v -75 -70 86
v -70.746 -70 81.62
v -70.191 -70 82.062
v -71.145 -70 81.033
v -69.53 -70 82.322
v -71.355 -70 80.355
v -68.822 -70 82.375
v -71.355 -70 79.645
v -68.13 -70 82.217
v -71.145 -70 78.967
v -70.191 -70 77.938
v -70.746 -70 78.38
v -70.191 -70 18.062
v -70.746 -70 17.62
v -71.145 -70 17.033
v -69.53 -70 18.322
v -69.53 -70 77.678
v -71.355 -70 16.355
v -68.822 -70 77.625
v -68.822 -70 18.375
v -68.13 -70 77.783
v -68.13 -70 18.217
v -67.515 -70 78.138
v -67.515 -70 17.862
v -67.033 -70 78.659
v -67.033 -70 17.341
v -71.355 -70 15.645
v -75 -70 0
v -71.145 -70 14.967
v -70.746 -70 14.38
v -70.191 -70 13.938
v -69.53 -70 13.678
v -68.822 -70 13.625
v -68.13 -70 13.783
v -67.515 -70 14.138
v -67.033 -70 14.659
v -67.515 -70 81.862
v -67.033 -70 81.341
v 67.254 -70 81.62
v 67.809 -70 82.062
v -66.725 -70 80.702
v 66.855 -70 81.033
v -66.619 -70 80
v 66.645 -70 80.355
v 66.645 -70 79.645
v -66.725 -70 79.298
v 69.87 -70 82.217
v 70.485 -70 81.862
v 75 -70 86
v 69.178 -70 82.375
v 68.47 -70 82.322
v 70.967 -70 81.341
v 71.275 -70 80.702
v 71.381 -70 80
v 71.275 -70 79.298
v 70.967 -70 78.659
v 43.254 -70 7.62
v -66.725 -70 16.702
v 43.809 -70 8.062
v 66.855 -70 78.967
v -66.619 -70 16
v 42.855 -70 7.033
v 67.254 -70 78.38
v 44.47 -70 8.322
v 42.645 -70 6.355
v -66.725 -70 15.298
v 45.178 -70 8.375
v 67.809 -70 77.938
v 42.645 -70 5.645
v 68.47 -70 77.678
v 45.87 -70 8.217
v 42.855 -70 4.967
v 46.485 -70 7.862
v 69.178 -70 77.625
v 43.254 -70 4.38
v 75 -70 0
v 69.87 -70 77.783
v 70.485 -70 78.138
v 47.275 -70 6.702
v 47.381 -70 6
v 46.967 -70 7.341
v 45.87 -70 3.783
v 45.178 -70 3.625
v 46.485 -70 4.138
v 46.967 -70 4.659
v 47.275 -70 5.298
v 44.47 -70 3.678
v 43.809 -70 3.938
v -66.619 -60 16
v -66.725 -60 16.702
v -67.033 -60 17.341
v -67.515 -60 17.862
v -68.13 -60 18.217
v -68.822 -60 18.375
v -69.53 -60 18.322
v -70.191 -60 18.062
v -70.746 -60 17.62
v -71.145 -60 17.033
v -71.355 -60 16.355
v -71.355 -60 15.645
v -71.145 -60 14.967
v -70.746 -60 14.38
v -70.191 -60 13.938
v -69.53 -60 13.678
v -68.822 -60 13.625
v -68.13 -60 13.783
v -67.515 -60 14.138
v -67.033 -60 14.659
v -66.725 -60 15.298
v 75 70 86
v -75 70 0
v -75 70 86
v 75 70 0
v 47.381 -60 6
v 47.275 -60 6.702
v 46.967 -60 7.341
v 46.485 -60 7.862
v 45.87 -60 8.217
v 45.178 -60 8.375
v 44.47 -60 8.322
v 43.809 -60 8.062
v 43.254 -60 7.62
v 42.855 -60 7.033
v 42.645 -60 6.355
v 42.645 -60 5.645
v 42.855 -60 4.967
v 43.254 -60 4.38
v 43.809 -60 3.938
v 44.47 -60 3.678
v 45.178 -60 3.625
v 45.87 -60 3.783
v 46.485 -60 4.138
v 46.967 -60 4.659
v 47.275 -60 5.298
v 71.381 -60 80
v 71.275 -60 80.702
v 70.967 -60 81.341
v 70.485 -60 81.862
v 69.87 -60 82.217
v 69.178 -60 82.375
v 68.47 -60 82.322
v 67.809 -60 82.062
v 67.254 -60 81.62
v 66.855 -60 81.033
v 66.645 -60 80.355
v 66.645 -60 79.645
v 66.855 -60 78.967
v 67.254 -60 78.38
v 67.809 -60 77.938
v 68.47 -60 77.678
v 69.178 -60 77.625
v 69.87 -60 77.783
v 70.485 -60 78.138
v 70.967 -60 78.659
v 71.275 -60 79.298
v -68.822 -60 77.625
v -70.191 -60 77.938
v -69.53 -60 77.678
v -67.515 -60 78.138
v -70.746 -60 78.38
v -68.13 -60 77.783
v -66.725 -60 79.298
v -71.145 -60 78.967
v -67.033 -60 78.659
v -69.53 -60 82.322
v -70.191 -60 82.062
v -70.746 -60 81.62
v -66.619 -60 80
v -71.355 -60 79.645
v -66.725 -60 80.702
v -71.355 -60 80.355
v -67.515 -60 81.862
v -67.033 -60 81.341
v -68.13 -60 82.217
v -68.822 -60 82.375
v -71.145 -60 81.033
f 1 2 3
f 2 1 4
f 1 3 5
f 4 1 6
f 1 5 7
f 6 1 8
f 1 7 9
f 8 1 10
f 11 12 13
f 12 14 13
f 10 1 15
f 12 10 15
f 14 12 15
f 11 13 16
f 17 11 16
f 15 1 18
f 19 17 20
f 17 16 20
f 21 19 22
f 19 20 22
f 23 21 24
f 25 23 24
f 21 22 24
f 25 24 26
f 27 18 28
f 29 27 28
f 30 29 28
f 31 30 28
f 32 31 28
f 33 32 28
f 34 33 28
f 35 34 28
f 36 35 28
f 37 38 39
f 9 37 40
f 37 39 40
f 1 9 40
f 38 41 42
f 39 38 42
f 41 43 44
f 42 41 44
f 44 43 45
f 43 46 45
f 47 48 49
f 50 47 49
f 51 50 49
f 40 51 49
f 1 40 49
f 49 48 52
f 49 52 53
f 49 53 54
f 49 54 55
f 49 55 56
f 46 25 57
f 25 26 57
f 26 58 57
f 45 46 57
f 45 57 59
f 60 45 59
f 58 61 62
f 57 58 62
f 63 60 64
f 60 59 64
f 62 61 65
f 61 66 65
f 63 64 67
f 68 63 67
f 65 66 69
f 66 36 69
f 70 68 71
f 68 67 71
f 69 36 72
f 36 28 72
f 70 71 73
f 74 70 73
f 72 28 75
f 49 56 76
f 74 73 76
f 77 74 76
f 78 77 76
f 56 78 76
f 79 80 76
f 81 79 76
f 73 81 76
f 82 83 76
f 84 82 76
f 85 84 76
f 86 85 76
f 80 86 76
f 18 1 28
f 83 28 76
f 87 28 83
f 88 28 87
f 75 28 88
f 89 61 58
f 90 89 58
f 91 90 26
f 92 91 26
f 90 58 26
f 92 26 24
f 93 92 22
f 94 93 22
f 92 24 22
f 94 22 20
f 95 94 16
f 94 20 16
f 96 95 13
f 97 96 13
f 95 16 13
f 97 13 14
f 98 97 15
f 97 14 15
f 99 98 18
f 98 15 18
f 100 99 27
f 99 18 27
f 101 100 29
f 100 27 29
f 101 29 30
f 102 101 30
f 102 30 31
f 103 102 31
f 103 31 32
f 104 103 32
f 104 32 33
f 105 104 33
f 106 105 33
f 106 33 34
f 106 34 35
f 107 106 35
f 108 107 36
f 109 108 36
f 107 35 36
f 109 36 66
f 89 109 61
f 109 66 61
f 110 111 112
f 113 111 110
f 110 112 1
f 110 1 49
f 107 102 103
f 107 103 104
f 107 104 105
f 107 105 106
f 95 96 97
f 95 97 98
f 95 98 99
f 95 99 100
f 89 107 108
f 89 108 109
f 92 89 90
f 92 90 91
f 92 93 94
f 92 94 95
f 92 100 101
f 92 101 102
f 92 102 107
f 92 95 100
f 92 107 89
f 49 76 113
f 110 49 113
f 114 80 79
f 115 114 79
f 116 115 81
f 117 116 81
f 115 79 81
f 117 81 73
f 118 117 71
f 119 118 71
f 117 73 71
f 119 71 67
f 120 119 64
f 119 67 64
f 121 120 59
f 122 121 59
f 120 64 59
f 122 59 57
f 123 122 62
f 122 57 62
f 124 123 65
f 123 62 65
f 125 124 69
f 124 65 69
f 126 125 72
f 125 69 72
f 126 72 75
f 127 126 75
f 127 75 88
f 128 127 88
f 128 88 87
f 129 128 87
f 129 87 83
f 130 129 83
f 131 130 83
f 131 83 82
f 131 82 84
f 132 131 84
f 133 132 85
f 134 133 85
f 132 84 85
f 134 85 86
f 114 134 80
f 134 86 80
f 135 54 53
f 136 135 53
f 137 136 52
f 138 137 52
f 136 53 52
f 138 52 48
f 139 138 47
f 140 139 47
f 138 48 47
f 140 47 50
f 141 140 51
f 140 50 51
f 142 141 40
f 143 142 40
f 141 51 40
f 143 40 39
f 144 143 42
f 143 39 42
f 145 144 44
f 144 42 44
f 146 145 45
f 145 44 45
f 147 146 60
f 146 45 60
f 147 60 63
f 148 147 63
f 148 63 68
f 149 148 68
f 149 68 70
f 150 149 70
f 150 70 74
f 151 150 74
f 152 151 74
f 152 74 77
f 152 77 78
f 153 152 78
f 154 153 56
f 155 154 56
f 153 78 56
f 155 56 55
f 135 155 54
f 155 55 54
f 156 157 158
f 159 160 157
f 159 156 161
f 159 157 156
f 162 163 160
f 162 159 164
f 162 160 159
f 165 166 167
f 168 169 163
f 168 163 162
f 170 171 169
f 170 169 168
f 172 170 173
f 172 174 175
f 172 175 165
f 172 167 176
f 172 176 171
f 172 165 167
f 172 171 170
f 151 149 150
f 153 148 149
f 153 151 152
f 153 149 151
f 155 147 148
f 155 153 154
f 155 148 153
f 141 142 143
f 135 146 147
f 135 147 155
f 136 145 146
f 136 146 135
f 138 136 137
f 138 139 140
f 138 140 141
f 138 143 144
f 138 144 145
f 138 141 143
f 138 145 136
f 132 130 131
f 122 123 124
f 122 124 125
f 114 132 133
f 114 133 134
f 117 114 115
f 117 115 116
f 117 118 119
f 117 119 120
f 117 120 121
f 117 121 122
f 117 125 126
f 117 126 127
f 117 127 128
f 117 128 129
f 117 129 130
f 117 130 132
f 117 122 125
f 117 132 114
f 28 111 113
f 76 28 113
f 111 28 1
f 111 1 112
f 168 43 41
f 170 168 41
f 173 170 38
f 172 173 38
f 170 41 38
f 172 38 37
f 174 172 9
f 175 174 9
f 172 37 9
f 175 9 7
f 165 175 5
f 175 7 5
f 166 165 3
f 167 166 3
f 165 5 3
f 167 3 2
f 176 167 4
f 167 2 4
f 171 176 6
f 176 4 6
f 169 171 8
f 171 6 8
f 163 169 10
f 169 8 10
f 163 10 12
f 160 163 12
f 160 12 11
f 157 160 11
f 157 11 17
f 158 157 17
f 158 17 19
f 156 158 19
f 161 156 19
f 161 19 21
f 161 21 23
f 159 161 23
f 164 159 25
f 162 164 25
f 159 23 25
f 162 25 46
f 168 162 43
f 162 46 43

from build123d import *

# Parameters (mm, degrees)
F0_W     = 150
F0_H     = 140
F1_DEPTH = 86
F2_R     = 2.38125
F3_DEPTH = 10


with BuildPart() as f1:
    # F0 (on Top) → F1 (new body)
    with BuildSketch(Plane.XY):
        Rectangle(F0_W, F0_H)
    extrude(amount=F1_DEPTH)

    # F2 (on face) → F3 (cut)
    with BuildSketch(Plane.XZ.offset(70)):
        with Locations((-69, 80)):
            Circle(F2_R)
        with Locations((-69, 16)):
            Circle(F2_R)
        with Locations((69, 80)):
            Circle(F2_R)
        with Locations((45, 6)):
            Circle(F2_R)
    extrude(amount=-F3_DEPTH, mode=Mode.SUBTRACT)


solid = f1.part
